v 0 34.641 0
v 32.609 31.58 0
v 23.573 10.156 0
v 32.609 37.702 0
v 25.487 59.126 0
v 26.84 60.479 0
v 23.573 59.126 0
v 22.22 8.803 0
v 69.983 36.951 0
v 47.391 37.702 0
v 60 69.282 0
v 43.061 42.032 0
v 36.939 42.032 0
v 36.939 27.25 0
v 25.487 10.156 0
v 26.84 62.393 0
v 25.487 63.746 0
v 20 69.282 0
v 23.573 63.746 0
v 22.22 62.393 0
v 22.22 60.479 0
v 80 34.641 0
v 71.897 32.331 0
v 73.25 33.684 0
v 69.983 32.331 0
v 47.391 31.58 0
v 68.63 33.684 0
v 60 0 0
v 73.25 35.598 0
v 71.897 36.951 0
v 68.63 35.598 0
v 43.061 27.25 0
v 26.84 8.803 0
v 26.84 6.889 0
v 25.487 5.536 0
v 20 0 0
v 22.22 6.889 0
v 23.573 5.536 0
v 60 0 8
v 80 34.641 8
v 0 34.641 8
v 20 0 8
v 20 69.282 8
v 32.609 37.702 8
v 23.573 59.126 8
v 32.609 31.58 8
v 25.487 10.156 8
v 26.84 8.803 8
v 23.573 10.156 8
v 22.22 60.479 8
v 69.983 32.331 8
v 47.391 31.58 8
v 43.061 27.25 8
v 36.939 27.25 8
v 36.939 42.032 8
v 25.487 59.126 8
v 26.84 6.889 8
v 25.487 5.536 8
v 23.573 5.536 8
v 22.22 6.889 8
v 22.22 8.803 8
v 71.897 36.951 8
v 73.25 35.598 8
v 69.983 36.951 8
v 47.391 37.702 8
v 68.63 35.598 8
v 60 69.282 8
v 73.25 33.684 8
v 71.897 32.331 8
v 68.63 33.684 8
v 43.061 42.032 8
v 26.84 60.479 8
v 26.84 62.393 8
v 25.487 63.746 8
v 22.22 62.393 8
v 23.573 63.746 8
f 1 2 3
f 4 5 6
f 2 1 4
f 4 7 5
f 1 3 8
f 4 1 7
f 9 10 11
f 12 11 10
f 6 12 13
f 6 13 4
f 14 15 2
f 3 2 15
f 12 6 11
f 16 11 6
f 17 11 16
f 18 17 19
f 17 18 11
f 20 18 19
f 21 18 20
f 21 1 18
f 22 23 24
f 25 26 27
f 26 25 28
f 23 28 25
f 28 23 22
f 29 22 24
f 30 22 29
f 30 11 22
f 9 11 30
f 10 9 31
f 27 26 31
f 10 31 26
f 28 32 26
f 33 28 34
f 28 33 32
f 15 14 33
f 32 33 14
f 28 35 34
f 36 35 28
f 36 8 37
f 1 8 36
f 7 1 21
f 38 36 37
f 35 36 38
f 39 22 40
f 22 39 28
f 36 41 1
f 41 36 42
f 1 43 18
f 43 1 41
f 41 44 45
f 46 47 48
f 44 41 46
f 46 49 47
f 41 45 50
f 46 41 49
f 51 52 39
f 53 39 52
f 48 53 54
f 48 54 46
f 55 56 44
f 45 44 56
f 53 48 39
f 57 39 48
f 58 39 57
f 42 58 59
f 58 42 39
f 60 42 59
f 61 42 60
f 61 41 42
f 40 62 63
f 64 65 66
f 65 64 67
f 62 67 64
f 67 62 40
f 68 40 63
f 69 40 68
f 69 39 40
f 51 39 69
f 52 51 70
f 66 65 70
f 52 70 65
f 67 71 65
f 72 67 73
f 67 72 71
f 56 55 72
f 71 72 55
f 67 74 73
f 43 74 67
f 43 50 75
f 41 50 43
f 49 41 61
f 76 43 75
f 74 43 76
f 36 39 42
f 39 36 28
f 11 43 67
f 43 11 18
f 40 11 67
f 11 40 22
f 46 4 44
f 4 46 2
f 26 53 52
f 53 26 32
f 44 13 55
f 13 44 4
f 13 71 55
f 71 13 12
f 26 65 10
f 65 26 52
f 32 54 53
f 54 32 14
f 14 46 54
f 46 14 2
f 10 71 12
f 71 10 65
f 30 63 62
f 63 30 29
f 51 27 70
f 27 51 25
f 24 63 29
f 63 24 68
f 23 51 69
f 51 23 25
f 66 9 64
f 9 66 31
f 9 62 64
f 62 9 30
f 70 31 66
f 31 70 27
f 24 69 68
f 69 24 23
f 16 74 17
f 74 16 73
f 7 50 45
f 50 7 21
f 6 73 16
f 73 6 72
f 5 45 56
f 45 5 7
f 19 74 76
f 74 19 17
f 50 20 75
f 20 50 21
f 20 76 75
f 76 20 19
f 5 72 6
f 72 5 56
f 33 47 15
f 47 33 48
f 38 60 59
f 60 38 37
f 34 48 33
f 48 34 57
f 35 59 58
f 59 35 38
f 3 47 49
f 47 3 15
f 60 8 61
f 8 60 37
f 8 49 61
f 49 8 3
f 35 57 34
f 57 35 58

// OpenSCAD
$fn = 32;

// ----------------------------------------------------------------------
// Polygon plate: 6-gon R40, 3 bolt windows
// ----------------------------------------------------------------------

// --- parameters (mm) ---
sides = 6;                // number of polygon sides
plate_r = 40;             // circumscribed radius of the polygon
bore_r = 8;               // centre bore radius
bolts = 3;                // number of bolt windows
ring_r = 30.94;           // bolt-circle radius
bolt_r = 2.5;             // bolt window radius
plate_t = 8;              // plate thickness, Z (extrusion height)

plate_d = 2 * plate_r;  // circumscribed diameter
bore_d = 2 * bore_r;  // centre bore diameter
bolt_d = 2 * bolt_r;  // bolt window diameter
ring_d = 2 * ring_r;  // bolt-circle diameter

profile = [[80, 34.641], [60, 69.282], [20, 69.282], [0, 34.641], [20, 0], [60, 0]];  // primary outline, 6 points, counter clockwise
void_1 = [[47.391, 37.702], [43.061, 42.032], [36.939, 42.032], [32.609, 37.702], [32.609, 31.58], [36.939, 27.25], [43.061, 27.25], [47.391, 31.58]];  // centre bore, 8 points
void_2 = [[73.25, 35.598], [71.897, 36.951], [69.983, 36.951], [68.63, 35.598], [68.63, 33.684], [69.983, 32.331], [71.897, 32.331], [73.25, 33.684]];  // bolt window 1, 8 points
void_3 = [[26.84, 62.393], [25.487, 63.746], [23.573, 63.746], [22.22, 62.393], [22.22, 60.479], [23.573, 59.126], [25.487, 59.126], [26.84, 60.479]];  // bolt window 2, 8 points
void_4 = [[26.84, 8.803], [25.487, 10.156], [23.573, 10.156], [22.22, 8.803], [22.22, 6.889], [23.573, 5.536], [25.487, 5.536], [26.84, 6.889]];  // bolt window 3, 8 points

// --- the one profile operation ---
difference() {
  linear_extrude(height = plate_t) polygon(points = profile);
  translate([0, 0, -1])
    linear_extrude(height = plate_t + 2) polygon(points = void_1);
  translate([0, 0, -1])
    linear_extrude(height = plate_t + 2) polygon(points = void_2);
  translate([0, 0, -1])
    linear_extrude(height = plate_t + 2) polygon(points = void_3);
  translate([0, 0, -1])
    linear_extrude(height = plate_t + 2) polygon(points = void_4);
}
